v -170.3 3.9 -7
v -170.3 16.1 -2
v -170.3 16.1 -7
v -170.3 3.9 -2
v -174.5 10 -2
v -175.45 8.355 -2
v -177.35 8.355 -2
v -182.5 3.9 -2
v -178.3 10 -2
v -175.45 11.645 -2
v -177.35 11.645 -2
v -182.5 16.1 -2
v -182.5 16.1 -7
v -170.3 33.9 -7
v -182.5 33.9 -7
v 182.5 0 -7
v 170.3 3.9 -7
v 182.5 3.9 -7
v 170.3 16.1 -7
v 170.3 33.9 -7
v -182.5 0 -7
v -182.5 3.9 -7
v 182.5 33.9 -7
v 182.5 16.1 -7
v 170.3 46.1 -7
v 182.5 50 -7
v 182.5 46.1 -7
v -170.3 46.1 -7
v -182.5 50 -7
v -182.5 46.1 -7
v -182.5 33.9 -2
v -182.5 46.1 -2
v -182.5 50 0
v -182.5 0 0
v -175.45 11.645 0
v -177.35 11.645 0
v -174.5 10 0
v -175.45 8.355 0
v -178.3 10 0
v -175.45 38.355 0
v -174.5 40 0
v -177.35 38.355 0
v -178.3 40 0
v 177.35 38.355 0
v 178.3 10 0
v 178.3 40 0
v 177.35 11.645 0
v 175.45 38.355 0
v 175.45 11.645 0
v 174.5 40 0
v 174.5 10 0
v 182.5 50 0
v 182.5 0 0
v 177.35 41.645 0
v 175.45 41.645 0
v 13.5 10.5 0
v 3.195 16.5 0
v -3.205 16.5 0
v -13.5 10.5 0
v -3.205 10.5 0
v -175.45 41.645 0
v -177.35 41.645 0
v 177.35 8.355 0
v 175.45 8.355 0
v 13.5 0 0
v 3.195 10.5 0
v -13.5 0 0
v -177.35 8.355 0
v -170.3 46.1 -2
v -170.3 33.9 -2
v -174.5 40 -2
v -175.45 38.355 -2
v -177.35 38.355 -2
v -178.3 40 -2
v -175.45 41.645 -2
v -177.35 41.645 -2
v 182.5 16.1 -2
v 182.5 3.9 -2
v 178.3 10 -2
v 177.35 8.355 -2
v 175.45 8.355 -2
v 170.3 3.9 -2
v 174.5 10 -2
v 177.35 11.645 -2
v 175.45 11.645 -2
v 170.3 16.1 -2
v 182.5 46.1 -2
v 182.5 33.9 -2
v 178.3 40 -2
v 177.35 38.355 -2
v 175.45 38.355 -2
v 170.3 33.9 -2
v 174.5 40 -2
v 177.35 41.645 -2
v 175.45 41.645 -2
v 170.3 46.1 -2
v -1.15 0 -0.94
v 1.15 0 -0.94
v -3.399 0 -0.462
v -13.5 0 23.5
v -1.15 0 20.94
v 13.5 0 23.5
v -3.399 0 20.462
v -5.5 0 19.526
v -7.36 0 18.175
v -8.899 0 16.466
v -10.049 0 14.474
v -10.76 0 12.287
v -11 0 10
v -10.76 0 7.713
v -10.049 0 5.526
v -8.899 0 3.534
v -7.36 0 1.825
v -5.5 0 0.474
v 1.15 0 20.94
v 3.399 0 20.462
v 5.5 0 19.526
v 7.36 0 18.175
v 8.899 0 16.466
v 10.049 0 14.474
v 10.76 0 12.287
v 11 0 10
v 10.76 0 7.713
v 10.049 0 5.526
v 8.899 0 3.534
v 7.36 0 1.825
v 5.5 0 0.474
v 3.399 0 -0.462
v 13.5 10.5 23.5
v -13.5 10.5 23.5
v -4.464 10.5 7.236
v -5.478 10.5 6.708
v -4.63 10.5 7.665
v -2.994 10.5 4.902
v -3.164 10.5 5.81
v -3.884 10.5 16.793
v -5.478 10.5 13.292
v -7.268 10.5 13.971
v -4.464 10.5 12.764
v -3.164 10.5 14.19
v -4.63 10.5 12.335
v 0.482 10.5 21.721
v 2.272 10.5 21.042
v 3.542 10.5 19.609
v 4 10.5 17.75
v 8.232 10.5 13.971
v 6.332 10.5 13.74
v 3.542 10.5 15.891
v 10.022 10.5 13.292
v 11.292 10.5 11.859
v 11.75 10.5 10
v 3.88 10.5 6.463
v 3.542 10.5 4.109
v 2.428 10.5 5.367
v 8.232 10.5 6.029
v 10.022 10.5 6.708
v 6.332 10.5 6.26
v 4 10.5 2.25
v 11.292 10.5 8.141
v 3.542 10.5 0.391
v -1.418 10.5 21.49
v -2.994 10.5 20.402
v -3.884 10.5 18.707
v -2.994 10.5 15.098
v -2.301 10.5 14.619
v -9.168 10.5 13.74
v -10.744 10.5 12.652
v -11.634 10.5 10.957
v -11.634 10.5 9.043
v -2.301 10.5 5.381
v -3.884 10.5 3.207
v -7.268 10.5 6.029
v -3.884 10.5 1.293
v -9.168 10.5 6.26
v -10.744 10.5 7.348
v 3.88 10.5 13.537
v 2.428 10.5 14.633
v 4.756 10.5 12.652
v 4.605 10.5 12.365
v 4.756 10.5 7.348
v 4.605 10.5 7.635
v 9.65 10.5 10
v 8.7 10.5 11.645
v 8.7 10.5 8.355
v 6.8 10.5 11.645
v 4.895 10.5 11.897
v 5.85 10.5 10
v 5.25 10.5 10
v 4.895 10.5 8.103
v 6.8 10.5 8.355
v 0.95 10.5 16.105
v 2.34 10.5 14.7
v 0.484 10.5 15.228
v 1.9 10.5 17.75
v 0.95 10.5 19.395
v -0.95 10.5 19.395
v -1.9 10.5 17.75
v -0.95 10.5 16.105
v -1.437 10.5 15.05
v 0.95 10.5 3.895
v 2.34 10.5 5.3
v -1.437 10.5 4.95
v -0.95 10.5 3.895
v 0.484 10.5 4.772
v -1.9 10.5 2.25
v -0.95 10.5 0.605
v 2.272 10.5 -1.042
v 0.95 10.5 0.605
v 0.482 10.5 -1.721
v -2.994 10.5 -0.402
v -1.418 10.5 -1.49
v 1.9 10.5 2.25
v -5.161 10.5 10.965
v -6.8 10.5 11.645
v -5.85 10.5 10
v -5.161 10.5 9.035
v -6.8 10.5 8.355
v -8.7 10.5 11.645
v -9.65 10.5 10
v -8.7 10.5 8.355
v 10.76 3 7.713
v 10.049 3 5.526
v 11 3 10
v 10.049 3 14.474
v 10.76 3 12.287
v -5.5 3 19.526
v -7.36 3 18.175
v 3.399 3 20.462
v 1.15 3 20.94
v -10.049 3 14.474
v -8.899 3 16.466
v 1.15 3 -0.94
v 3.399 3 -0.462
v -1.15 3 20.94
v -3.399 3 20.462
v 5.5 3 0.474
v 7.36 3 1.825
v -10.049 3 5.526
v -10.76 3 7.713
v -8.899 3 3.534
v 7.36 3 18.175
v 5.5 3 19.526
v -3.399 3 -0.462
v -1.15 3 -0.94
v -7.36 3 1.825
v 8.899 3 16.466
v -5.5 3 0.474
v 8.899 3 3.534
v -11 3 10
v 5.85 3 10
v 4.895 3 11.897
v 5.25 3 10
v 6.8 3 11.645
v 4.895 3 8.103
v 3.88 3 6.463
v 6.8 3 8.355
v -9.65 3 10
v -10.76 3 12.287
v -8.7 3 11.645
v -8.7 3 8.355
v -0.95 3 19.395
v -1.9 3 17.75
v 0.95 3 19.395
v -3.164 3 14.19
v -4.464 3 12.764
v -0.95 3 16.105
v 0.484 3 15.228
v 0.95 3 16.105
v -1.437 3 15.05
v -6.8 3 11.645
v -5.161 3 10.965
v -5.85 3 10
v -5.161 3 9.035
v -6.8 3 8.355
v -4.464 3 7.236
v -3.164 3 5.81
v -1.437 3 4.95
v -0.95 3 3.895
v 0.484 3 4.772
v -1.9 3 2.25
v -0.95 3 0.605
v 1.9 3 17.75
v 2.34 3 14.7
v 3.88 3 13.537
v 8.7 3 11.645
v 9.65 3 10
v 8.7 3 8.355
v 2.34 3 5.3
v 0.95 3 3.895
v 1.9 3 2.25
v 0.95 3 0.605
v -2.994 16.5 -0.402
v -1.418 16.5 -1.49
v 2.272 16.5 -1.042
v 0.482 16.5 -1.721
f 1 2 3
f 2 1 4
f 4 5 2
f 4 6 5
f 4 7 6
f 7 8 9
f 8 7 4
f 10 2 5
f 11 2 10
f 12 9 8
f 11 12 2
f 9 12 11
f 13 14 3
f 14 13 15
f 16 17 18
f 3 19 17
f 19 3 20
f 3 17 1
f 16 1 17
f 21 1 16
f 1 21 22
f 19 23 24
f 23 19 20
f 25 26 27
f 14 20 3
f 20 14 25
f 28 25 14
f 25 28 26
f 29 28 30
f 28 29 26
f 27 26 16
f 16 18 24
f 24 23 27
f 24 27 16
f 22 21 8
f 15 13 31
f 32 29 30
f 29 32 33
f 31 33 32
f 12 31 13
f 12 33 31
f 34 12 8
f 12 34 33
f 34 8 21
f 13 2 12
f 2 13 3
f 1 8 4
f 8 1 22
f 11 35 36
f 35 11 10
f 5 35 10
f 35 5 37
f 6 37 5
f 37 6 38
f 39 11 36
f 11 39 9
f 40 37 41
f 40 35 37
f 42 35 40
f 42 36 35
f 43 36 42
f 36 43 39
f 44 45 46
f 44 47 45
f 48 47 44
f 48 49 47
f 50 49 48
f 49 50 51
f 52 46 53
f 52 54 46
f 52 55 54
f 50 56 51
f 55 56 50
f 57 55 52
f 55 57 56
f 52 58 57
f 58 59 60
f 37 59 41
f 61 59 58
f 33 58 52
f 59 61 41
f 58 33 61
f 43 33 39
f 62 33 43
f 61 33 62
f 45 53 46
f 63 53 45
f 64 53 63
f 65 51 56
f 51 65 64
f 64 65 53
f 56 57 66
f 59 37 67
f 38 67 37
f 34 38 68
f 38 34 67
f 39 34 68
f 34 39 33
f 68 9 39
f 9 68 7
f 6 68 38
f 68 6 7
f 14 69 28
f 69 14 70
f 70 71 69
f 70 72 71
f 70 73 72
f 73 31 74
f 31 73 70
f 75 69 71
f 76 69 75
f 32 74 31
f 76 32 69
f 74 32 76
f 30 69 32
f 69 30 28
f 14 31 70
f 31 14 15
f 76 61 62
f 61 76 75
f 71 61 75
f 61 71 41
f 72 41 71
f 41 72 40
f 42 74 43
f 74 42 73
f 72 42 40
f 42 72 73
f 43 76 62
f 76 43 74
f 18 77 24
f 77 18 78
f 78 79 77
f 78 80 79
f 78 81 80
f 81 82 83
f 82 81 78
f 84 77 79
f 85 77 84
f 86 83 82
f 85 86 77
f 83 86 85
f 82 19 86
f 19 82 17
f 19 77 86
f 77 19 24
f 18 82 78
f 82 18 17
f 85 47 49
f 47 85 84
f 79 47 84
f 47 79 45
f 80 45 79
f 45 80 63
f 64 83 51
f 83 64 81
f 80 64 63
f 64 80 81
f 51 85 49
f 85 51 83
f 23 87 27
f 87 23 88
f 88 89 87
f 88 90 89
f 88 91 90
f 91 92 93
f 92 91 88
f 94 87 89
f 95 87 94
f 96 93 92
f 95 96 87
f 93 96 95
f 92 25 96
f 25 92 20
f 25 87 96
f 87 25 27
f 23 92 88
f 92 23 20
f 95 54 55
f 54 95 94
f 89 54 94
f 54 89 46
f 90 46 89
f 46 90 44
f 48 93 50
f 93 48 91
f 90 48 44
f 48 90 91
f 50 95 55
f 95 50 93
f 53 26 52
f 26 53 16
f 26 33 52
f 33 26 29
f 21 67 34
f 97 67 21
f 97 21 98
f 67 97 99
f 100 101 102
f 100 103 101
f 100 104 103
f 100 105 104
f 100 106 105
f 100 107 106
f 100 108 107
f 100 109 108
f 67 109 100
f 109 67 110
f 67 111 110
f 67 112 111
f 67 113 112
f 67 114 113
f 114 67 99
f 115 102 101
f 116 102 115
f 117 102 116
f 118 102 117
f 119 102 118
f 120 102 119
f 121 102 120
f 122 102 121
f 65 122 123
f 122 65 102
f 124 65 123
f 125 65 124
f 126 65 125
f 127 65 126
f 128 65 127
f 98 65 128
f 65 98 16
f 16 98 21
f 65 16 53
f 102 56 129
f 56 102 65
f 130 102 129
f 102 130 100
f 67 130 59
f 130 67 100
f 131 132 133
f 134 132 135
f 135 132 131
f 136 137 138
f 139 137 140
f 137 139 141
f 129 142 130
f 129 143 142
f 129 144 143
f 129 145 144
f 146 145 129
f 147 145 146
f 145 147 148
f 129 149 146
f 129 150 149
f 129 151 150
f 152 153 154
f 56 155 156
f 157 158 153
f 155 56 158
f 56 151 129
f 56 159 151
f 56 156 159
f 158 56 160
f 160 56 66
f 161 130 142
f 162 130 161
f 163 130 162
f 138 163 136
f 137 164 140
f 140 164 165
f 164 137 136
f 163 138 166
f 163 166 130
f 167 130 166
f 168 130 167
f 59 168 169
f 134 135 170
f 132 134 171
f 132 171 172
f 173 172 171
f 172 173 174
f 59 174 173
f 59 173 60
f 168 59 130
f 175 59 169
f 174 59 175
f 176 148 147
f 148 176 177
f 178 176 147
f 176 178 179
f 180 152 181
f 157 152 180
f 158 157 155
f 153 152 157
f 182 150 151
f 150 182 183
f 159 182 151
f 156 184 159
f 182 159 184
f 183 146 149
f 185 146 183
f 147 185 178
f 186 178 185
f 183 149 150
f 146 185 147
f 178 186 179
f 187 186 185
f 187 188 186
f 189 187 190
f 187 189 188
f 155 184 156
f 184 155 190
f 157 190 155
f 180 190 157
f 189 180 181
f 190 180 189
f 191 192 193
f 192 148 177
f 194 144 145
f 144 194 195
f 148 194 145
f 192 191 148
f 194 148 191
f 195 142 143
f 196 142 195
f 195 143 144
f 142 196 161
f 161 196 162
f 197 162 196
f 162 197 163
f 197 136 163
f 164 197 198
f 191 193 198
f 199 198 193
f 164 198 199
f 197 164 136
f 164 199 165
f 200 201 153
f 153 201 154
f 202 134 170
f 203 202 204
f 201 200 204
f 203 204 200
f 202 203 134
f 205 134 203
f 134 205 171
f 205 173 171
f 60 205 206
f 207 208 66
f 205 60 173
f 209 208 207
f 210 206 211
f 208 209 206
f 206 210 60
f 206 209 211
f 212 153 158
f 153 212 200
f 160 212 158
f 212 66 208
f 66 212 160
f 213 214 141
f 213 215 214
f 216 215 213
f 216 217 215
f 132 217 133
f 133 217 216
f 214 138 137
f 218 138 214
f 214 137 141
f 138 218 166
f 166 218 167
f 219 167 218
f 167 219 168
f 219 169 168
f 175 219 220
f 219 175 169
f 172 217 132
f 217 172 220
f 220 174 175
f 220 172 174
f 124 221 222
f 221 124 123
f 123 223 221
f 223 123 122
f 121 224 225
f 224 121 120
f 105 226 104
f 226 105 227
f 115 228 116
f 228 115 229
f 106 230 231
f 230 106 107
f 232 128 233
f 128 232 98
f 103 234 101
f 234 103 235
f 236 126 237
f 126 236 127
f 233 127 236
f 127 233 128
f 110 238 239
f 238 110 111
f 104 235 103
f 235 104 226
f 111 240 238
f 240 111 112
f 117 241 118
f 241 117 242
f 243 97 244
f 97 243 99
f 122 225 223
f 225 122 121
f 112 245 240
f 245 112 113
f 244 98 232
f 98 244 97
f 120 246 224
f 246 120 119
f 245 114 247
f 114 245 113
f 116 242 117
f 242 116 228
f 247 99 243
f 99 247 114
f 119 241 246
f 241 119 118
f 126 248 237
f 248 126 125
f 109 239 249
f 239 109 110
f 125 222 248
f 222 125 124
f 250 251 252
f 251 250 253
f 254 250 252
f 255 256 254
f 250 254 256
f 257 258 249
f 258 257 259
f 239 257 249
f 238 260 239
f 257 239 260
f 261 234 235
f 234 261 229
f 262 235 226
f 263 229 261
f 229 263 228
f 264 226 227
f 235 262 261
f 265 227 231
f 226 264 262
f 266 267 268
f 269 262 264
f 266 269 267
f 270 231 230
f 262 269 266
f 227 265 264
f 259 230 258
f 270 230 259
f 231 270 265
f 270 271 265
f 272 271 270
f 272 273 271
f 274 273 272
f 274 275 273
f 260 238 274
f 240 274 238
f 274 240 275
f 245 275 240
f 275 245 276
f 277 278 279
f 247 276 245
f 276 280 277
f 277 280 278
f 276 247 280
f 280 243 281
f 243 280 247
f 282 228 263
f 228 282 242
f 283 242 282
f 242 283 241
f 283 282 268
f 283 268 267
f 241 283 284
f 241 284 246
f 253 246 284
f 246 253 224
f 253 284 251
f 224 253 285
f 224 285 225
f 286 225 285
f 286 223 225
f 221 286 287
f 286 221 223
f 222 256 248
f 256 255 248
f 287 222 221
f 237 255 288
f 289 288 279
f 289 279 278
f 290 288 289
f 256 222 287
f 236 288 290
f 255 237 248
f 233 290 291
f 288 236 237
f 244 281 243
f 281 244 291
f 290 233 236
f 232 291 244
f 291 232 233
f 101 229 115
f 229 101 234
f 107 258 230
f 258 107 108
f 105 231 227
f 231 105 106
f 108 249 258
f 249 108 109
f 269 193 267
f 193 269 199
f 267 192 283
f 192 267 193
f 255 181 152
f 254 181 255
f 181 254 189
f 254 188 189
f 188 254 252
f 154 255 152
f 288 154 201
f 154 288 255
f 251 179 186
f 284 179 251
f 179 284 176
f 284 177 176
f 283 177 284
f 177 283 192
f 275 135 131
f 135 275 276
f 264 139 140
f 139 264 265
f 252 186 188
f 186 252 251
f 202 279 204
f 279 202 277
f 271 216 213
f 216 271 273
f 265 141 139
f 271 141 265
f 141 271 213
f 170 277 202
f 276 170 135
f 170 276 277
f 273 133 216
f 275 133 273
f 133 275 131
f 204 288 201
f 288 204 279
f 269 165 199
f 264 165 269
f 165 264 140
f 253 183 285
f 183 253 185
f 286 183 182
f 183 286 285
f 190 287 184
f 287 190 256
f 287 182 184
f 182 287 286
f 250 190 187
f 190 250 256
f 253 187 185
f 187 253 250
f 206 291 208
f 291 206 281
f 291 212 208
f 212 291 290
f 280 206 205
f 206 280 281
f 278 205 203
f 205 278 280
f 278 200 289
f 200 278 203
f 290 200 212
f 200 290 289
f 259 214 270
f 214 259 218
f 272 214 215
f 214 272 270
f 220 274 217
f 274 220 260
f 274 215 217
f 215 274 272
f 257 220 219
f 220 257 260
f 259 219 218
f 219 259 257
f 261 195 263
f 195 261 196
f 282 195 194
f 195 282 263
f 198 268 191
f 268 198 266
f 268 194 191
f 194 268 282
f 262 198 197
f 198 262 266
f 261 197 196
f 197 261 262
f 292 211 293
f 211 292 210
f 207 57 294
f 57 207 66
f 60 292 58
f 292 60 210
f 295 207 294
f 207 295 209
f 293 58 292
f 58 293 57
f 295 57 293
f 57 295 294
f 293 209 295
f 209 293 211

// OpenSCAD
// file: traveler_negative.scad
include <shared_variables.scad>

traveler_negative();

module traveler_negative() {
    union() {
        cylinder(d = traveler_ring_d, h = traveler_ring_th);
        cylinder(d = traveler_nut_d, h = traveler_nut_length);
        translate([traveler_screw_r, 0, 0]) cylinder(d = m3_hole_d, h = 10.5);
        translate([0, traveler_screw_r, 0]) cylinder(d = m3_hole_d, h = 10.5);
        translate([-traveler_screw_r, 0, 0]) cylinder(d = m3_hole_d, h = 10.5);
        translate([0, -traveler_screw_r, 0]) cylinder(d = m3_hole_d, h = 10.5);
        translate([traveler_screw_r, 0, 10.5]) cylinder(d = 8, h = 6);
        translate([0, traveler_screw_r, 10.5]) cylinder(d = 8, h = 6);
        translate([-traveler_screw_r, 0, 10.5]) cylinder(d = 8, h = 6);
        translate([0, -traveler_screw_r, 10.5]) cylinder(d = 8, h = 6);
    }
}
// file: shared_variables.scad
// sled
sled_length = 29.5;
sled_width = 34.5;
sled_x_distance = 17.5;
sled_y_distance = 23.5;
sled_screw_hole_diameter = 4.8;
sled_screw_head_diameter = 8.5;
sled_screw_head_th = 3;

// nema 17 stepper motor
motor_width = 45;
motor_mount_height = 40;

// roundbar
axle_holder_width = 30;
axle_set_depth = 12;
roundbar_diameter = 8 + 0.45;
axle_mount_hole_center = (axle_holder_width - roundbar_diameter) / 4;
axle_fastener_height = 11;

// axle_bearing
bearing_diameter = 22.5;
bearing_thickness = 8;
bearing_mount_width = bearing_diameter + 16;

// traveler
traveler_nut_d = 10.5;
traveler_ring_d = 22;
traveler_ring_th = 3;
traveler_nut_length = 10.5;
traveler_screw_r = 15.5/2;
traveler_downset = 10;

// general
y_axle_distance = 30;
bottom_th = 8;
wall_th = 8;
sled_clearing_distance = 10 + 2;
motor_backset = 30;
axle_height = 20;
motor_mount_width = motor_width / 2 + y_axle_distance + axle_holder_width / 2;
m3_hole_d = 3.8;
// main file
include <shared_variables.scad>
use <traveler_negative.scad>

wall = 4;
width = y_axle_distance + 12 + 2 * wall;
length = 365;
th = 7;
tounge = [12.2, 12.2, 5];

difference() {
    translate([0, width / 2, - (th / 2)]) {
        union() {
            difference() {
                cube([length, width, th], true);
                translate([-length / 2, -y_axle_distance / 2 - tounge[1] / 2, - th / 2]) {
                    cube(tounge);
                    translate([tounge[0] / 2, tounge[1] / 2, 0]) cylinder(d = m3_hole_d, h = th);
                }
                translate([-length / 2, y_axle_distance / 2 - tounge[1] / 2, - th / 2]) {
                    cube(tounge);
                    translate([tounge[0] / 2, tounge[1] / 2, 0]) cylinder(d = m3_hole_d, h = th);
                }
                translate([length / 2 - tounge[0], -y_axle_distance / 2 - tounge[1] / 2, - th / 2]) {
                    cube(tounge);
                    translate([tounge[0] / 2, tounge[1] / 2, 0]) cylinder(d = m3_hole_d, h = th);
                }
                translate([length / 2 - tounge[0], y_axle_distance / 2 - tounge[1] / 2, - th / 2]) {
                    cube(tounge);
                    translate([tounge[0] / 2, tounge[1] / 2, 0]) cylinder(d = m3_hole_d, h = th);
                }
            }
            translate([0, - width / 2 + traveler_nut_length / 2, th / 2 + (traveler_downset + traveler_ring_d / 2 + 2.5) / 2])
                cube([traveler_ring_d + 5, traveler_nut_length, (traveler_downset + traveler_ring_d / 2 + 2.5)], true);
        }
    }
    translate([0, 0, traveler_downset])
    rotate([270, 0, 0])
    traveler_negative();
}
